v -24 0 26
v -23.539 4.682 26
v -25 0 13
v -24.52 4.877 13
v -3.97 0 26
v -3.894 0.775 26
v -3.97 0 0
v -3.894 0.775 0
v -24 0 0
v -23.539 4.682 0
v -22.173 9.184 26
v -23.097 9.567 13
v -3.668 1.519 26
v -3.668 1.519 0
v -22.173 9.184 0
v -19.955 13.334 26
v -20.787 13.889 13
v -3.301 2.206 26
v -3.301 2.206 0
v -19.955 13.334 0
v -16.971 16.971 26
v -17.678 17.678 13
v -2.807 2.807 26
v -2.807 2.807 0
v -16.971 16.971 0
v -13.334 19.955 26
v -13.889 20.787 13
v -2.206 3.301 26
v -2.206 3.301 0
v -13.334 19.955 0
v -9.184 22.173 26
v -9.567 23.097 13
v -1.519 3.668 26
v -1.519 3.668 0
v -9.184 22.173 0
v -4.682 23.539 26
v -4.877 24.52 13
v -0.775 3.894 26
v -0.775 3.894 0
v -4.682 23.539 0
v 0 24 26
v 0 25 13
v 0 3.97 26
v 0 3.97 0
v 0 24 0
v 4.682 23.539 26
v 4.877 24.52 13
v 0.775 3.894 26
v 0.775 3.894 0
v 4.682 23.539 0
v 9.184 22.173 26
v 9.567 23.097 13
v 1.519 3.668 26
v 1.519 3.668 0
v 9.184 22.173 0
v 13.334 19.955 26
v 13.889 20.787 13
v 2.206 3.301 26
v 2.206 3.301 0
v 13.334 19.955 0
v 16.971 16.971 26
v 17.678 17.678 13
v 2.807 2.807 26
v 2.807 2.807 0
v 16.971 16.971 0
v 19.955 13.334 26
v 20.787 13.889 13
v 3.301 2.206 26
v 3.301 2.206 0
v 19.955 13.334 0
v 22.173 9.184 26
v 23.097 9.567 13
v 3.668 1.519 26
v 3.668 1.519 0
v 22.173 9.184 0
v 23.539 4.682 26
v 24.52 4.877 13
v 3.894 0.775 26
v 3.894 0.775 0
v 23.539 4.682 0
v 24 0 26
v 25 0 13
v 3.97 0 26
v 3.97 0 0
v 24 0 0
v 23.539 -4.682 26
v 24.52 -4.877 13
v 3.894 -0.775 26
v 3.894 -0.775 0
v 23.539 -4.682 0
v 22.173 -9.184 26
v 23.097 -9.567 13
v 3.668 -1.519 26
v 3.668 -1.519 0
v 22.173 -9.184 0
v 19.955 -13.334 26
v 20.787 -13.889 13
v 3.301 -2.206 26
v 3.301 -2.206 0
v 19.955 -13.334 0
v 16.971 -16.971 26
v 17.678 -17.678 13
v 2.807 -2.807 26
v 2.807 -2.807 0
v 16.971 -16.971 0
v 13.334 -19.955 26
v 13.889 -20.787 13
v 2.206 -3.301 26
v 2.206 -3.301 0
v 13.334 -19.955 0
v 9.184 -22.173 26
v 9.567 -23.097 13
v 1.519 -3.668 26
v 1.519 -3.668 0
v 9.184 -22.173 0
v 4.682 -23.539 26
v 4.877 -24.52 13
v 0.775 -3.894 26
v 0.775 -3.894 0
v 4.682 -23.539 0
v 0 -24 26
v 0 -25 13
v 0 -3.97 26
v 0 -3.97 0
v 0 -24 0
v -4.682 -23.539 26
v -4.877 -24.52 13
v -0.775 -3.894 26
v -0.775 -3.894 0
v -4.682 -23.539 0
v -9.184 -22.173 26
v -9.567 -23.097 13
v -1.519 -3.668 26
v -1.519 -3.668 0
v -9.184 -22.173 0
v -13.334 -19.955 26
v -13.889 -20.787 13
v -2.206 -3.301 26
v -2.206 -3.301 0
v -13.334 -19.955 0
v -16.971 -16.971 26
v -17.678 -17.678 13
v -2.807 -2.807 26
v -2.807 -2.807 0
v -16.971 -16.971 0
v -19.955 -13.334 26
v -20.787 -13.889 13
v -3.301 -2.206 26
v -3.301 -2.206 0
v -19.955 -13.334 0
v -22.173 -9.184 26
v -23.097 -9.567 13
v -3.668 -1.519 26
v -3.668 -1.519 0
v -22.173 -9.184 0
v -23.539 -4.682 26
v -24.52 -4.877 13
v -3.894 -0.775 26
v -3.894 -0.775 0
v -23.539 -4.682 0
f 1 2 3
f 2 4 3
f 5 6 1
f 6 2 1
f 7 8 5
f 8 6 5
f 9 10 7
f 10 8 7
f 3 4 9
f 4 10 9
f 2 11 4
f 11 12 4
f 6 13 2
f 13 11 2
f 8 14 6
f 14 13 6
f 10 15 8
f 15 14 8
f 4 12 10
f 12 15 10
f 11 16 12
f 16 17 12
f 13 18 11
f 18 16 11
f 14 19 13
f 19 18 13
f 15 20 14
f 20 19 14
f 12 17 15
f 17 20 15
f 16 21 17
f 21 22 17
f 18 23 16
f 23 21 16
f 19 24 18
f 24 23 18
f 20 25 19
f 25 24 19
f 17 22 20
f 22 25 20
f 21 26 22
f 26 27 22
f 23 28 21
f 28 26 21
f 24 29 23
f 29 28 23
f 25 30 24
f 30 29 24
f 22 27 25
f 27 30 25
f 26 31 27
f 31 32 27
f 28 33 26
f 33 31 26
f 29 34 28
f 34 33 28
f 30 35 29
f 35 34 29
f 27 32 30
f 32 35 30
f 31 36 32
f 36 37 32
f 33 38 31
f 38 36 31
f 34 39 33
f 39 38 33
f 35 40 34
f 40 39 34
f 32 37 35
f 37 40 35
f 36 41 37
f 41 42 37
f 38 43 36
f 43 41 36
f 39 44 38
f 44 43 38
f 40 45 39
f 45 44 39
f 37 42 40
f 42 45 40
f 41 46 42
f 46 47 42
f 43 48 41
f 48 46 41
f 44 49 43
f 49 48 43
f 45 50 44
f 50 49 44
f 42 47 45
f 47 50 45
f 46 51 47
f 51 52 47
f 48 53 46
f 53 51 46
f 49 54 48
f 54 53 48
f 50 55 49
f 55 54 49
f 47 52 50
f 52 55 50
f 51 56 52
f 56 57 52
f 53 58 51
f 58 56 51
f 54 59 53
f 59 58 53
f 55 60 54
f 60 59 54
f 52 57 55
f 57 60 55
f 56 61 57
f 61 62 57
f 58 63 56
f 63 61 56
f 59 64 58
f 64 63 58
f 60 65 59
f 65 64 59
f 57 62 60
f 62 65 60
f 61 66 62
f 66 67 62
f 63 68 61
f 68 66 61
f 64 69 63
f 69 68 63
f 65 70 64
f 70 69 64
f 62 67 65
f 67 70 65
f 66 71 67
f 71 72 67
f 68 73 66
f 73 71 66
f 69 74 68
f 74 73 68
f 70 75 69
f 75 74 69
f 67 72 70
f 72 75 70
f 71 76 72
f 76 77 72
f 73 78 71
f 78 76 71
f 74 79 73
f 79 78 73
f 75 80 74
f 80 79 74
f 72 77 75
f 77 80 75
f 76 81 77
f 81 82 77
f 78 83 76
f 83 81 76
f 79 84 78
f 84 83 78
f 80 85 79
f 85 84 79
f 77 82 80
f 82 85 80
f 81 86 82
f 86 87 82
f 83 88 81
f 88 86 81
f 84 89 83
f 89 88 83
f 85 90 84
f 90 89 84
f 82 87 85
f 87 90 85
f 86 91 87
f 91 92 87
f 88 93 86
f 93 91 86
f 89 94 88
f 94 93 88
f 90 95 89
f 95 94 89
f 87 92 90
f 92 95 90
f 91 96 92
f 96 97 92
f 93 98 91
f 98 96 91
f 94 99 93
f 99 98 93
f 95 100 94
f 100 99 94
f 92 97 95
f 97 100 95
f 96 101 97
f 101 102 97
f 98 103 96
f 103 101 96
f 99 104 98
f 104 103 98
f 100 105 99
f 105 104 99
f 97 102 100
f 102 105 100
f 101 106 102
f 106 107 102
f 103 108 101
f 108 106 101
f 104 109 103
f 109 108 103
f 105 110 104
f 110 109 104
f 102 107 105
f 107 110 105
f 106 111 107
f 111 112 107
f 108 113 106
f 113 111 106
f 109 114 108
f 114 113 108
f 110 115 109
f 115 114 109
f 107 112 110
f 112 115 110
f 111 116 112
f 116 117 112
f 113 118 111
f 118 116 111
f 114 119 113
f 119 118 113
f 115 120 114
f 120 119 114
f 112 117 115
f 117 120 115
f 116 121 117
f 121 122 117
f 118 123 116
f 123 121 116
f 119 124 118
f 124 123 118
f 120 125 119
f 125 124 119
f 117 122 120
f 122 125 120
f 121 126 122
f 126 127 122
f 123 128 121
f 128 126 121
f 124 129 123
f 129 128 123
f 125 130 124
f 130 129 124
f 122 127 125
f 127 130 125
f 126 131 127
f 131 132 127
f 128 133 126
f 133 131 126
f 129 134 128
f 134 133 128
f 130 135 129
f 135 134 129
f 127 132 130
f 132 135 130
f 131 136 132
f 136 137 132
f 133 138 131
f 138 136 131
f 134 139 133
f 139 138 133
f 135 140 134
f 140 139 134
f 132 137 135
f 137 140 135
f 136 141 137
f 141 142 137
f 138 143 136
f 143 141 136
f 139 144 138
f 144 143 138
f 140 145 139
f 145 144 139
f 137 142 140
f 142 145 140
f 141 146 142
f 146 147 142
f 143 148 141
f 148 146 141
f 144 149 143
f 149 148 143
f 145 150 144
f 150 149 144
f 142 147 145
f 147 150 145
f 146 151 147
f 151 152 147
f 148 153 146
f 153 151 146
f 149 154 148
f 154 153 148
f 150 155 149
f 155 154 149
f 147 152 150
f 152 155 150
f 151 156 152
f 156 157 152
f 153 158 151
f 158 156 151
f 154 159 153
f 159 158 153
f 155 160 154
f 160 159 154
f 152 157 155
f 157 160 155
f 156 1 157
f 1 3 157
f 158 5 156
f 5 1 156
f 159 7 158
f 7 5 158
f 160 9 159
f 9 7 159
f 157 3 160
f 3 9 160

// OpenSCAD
$fn = 32;

// ----------------------------------------------------------------------
// Belt roller: 48 mm barrel, 26 mm wide, bore 7.94 mm
// ----------------------------------------------------------------------

// --- parameters (mm) ---
bore_d = 7.94;            // bore
barrel_d = 48;            // barrel diameter
roller_w = 26;            // roller width
crown = 1;                // crown height at mid width

roller_profile = [[3.97, 0], [24, 0], [25, 13], [24, 26], [3.97, 26]];

/* the profile stays clear of the axis, so the bore comes out of the revolve */
rotate_extrude() polygon(roller_profile);
